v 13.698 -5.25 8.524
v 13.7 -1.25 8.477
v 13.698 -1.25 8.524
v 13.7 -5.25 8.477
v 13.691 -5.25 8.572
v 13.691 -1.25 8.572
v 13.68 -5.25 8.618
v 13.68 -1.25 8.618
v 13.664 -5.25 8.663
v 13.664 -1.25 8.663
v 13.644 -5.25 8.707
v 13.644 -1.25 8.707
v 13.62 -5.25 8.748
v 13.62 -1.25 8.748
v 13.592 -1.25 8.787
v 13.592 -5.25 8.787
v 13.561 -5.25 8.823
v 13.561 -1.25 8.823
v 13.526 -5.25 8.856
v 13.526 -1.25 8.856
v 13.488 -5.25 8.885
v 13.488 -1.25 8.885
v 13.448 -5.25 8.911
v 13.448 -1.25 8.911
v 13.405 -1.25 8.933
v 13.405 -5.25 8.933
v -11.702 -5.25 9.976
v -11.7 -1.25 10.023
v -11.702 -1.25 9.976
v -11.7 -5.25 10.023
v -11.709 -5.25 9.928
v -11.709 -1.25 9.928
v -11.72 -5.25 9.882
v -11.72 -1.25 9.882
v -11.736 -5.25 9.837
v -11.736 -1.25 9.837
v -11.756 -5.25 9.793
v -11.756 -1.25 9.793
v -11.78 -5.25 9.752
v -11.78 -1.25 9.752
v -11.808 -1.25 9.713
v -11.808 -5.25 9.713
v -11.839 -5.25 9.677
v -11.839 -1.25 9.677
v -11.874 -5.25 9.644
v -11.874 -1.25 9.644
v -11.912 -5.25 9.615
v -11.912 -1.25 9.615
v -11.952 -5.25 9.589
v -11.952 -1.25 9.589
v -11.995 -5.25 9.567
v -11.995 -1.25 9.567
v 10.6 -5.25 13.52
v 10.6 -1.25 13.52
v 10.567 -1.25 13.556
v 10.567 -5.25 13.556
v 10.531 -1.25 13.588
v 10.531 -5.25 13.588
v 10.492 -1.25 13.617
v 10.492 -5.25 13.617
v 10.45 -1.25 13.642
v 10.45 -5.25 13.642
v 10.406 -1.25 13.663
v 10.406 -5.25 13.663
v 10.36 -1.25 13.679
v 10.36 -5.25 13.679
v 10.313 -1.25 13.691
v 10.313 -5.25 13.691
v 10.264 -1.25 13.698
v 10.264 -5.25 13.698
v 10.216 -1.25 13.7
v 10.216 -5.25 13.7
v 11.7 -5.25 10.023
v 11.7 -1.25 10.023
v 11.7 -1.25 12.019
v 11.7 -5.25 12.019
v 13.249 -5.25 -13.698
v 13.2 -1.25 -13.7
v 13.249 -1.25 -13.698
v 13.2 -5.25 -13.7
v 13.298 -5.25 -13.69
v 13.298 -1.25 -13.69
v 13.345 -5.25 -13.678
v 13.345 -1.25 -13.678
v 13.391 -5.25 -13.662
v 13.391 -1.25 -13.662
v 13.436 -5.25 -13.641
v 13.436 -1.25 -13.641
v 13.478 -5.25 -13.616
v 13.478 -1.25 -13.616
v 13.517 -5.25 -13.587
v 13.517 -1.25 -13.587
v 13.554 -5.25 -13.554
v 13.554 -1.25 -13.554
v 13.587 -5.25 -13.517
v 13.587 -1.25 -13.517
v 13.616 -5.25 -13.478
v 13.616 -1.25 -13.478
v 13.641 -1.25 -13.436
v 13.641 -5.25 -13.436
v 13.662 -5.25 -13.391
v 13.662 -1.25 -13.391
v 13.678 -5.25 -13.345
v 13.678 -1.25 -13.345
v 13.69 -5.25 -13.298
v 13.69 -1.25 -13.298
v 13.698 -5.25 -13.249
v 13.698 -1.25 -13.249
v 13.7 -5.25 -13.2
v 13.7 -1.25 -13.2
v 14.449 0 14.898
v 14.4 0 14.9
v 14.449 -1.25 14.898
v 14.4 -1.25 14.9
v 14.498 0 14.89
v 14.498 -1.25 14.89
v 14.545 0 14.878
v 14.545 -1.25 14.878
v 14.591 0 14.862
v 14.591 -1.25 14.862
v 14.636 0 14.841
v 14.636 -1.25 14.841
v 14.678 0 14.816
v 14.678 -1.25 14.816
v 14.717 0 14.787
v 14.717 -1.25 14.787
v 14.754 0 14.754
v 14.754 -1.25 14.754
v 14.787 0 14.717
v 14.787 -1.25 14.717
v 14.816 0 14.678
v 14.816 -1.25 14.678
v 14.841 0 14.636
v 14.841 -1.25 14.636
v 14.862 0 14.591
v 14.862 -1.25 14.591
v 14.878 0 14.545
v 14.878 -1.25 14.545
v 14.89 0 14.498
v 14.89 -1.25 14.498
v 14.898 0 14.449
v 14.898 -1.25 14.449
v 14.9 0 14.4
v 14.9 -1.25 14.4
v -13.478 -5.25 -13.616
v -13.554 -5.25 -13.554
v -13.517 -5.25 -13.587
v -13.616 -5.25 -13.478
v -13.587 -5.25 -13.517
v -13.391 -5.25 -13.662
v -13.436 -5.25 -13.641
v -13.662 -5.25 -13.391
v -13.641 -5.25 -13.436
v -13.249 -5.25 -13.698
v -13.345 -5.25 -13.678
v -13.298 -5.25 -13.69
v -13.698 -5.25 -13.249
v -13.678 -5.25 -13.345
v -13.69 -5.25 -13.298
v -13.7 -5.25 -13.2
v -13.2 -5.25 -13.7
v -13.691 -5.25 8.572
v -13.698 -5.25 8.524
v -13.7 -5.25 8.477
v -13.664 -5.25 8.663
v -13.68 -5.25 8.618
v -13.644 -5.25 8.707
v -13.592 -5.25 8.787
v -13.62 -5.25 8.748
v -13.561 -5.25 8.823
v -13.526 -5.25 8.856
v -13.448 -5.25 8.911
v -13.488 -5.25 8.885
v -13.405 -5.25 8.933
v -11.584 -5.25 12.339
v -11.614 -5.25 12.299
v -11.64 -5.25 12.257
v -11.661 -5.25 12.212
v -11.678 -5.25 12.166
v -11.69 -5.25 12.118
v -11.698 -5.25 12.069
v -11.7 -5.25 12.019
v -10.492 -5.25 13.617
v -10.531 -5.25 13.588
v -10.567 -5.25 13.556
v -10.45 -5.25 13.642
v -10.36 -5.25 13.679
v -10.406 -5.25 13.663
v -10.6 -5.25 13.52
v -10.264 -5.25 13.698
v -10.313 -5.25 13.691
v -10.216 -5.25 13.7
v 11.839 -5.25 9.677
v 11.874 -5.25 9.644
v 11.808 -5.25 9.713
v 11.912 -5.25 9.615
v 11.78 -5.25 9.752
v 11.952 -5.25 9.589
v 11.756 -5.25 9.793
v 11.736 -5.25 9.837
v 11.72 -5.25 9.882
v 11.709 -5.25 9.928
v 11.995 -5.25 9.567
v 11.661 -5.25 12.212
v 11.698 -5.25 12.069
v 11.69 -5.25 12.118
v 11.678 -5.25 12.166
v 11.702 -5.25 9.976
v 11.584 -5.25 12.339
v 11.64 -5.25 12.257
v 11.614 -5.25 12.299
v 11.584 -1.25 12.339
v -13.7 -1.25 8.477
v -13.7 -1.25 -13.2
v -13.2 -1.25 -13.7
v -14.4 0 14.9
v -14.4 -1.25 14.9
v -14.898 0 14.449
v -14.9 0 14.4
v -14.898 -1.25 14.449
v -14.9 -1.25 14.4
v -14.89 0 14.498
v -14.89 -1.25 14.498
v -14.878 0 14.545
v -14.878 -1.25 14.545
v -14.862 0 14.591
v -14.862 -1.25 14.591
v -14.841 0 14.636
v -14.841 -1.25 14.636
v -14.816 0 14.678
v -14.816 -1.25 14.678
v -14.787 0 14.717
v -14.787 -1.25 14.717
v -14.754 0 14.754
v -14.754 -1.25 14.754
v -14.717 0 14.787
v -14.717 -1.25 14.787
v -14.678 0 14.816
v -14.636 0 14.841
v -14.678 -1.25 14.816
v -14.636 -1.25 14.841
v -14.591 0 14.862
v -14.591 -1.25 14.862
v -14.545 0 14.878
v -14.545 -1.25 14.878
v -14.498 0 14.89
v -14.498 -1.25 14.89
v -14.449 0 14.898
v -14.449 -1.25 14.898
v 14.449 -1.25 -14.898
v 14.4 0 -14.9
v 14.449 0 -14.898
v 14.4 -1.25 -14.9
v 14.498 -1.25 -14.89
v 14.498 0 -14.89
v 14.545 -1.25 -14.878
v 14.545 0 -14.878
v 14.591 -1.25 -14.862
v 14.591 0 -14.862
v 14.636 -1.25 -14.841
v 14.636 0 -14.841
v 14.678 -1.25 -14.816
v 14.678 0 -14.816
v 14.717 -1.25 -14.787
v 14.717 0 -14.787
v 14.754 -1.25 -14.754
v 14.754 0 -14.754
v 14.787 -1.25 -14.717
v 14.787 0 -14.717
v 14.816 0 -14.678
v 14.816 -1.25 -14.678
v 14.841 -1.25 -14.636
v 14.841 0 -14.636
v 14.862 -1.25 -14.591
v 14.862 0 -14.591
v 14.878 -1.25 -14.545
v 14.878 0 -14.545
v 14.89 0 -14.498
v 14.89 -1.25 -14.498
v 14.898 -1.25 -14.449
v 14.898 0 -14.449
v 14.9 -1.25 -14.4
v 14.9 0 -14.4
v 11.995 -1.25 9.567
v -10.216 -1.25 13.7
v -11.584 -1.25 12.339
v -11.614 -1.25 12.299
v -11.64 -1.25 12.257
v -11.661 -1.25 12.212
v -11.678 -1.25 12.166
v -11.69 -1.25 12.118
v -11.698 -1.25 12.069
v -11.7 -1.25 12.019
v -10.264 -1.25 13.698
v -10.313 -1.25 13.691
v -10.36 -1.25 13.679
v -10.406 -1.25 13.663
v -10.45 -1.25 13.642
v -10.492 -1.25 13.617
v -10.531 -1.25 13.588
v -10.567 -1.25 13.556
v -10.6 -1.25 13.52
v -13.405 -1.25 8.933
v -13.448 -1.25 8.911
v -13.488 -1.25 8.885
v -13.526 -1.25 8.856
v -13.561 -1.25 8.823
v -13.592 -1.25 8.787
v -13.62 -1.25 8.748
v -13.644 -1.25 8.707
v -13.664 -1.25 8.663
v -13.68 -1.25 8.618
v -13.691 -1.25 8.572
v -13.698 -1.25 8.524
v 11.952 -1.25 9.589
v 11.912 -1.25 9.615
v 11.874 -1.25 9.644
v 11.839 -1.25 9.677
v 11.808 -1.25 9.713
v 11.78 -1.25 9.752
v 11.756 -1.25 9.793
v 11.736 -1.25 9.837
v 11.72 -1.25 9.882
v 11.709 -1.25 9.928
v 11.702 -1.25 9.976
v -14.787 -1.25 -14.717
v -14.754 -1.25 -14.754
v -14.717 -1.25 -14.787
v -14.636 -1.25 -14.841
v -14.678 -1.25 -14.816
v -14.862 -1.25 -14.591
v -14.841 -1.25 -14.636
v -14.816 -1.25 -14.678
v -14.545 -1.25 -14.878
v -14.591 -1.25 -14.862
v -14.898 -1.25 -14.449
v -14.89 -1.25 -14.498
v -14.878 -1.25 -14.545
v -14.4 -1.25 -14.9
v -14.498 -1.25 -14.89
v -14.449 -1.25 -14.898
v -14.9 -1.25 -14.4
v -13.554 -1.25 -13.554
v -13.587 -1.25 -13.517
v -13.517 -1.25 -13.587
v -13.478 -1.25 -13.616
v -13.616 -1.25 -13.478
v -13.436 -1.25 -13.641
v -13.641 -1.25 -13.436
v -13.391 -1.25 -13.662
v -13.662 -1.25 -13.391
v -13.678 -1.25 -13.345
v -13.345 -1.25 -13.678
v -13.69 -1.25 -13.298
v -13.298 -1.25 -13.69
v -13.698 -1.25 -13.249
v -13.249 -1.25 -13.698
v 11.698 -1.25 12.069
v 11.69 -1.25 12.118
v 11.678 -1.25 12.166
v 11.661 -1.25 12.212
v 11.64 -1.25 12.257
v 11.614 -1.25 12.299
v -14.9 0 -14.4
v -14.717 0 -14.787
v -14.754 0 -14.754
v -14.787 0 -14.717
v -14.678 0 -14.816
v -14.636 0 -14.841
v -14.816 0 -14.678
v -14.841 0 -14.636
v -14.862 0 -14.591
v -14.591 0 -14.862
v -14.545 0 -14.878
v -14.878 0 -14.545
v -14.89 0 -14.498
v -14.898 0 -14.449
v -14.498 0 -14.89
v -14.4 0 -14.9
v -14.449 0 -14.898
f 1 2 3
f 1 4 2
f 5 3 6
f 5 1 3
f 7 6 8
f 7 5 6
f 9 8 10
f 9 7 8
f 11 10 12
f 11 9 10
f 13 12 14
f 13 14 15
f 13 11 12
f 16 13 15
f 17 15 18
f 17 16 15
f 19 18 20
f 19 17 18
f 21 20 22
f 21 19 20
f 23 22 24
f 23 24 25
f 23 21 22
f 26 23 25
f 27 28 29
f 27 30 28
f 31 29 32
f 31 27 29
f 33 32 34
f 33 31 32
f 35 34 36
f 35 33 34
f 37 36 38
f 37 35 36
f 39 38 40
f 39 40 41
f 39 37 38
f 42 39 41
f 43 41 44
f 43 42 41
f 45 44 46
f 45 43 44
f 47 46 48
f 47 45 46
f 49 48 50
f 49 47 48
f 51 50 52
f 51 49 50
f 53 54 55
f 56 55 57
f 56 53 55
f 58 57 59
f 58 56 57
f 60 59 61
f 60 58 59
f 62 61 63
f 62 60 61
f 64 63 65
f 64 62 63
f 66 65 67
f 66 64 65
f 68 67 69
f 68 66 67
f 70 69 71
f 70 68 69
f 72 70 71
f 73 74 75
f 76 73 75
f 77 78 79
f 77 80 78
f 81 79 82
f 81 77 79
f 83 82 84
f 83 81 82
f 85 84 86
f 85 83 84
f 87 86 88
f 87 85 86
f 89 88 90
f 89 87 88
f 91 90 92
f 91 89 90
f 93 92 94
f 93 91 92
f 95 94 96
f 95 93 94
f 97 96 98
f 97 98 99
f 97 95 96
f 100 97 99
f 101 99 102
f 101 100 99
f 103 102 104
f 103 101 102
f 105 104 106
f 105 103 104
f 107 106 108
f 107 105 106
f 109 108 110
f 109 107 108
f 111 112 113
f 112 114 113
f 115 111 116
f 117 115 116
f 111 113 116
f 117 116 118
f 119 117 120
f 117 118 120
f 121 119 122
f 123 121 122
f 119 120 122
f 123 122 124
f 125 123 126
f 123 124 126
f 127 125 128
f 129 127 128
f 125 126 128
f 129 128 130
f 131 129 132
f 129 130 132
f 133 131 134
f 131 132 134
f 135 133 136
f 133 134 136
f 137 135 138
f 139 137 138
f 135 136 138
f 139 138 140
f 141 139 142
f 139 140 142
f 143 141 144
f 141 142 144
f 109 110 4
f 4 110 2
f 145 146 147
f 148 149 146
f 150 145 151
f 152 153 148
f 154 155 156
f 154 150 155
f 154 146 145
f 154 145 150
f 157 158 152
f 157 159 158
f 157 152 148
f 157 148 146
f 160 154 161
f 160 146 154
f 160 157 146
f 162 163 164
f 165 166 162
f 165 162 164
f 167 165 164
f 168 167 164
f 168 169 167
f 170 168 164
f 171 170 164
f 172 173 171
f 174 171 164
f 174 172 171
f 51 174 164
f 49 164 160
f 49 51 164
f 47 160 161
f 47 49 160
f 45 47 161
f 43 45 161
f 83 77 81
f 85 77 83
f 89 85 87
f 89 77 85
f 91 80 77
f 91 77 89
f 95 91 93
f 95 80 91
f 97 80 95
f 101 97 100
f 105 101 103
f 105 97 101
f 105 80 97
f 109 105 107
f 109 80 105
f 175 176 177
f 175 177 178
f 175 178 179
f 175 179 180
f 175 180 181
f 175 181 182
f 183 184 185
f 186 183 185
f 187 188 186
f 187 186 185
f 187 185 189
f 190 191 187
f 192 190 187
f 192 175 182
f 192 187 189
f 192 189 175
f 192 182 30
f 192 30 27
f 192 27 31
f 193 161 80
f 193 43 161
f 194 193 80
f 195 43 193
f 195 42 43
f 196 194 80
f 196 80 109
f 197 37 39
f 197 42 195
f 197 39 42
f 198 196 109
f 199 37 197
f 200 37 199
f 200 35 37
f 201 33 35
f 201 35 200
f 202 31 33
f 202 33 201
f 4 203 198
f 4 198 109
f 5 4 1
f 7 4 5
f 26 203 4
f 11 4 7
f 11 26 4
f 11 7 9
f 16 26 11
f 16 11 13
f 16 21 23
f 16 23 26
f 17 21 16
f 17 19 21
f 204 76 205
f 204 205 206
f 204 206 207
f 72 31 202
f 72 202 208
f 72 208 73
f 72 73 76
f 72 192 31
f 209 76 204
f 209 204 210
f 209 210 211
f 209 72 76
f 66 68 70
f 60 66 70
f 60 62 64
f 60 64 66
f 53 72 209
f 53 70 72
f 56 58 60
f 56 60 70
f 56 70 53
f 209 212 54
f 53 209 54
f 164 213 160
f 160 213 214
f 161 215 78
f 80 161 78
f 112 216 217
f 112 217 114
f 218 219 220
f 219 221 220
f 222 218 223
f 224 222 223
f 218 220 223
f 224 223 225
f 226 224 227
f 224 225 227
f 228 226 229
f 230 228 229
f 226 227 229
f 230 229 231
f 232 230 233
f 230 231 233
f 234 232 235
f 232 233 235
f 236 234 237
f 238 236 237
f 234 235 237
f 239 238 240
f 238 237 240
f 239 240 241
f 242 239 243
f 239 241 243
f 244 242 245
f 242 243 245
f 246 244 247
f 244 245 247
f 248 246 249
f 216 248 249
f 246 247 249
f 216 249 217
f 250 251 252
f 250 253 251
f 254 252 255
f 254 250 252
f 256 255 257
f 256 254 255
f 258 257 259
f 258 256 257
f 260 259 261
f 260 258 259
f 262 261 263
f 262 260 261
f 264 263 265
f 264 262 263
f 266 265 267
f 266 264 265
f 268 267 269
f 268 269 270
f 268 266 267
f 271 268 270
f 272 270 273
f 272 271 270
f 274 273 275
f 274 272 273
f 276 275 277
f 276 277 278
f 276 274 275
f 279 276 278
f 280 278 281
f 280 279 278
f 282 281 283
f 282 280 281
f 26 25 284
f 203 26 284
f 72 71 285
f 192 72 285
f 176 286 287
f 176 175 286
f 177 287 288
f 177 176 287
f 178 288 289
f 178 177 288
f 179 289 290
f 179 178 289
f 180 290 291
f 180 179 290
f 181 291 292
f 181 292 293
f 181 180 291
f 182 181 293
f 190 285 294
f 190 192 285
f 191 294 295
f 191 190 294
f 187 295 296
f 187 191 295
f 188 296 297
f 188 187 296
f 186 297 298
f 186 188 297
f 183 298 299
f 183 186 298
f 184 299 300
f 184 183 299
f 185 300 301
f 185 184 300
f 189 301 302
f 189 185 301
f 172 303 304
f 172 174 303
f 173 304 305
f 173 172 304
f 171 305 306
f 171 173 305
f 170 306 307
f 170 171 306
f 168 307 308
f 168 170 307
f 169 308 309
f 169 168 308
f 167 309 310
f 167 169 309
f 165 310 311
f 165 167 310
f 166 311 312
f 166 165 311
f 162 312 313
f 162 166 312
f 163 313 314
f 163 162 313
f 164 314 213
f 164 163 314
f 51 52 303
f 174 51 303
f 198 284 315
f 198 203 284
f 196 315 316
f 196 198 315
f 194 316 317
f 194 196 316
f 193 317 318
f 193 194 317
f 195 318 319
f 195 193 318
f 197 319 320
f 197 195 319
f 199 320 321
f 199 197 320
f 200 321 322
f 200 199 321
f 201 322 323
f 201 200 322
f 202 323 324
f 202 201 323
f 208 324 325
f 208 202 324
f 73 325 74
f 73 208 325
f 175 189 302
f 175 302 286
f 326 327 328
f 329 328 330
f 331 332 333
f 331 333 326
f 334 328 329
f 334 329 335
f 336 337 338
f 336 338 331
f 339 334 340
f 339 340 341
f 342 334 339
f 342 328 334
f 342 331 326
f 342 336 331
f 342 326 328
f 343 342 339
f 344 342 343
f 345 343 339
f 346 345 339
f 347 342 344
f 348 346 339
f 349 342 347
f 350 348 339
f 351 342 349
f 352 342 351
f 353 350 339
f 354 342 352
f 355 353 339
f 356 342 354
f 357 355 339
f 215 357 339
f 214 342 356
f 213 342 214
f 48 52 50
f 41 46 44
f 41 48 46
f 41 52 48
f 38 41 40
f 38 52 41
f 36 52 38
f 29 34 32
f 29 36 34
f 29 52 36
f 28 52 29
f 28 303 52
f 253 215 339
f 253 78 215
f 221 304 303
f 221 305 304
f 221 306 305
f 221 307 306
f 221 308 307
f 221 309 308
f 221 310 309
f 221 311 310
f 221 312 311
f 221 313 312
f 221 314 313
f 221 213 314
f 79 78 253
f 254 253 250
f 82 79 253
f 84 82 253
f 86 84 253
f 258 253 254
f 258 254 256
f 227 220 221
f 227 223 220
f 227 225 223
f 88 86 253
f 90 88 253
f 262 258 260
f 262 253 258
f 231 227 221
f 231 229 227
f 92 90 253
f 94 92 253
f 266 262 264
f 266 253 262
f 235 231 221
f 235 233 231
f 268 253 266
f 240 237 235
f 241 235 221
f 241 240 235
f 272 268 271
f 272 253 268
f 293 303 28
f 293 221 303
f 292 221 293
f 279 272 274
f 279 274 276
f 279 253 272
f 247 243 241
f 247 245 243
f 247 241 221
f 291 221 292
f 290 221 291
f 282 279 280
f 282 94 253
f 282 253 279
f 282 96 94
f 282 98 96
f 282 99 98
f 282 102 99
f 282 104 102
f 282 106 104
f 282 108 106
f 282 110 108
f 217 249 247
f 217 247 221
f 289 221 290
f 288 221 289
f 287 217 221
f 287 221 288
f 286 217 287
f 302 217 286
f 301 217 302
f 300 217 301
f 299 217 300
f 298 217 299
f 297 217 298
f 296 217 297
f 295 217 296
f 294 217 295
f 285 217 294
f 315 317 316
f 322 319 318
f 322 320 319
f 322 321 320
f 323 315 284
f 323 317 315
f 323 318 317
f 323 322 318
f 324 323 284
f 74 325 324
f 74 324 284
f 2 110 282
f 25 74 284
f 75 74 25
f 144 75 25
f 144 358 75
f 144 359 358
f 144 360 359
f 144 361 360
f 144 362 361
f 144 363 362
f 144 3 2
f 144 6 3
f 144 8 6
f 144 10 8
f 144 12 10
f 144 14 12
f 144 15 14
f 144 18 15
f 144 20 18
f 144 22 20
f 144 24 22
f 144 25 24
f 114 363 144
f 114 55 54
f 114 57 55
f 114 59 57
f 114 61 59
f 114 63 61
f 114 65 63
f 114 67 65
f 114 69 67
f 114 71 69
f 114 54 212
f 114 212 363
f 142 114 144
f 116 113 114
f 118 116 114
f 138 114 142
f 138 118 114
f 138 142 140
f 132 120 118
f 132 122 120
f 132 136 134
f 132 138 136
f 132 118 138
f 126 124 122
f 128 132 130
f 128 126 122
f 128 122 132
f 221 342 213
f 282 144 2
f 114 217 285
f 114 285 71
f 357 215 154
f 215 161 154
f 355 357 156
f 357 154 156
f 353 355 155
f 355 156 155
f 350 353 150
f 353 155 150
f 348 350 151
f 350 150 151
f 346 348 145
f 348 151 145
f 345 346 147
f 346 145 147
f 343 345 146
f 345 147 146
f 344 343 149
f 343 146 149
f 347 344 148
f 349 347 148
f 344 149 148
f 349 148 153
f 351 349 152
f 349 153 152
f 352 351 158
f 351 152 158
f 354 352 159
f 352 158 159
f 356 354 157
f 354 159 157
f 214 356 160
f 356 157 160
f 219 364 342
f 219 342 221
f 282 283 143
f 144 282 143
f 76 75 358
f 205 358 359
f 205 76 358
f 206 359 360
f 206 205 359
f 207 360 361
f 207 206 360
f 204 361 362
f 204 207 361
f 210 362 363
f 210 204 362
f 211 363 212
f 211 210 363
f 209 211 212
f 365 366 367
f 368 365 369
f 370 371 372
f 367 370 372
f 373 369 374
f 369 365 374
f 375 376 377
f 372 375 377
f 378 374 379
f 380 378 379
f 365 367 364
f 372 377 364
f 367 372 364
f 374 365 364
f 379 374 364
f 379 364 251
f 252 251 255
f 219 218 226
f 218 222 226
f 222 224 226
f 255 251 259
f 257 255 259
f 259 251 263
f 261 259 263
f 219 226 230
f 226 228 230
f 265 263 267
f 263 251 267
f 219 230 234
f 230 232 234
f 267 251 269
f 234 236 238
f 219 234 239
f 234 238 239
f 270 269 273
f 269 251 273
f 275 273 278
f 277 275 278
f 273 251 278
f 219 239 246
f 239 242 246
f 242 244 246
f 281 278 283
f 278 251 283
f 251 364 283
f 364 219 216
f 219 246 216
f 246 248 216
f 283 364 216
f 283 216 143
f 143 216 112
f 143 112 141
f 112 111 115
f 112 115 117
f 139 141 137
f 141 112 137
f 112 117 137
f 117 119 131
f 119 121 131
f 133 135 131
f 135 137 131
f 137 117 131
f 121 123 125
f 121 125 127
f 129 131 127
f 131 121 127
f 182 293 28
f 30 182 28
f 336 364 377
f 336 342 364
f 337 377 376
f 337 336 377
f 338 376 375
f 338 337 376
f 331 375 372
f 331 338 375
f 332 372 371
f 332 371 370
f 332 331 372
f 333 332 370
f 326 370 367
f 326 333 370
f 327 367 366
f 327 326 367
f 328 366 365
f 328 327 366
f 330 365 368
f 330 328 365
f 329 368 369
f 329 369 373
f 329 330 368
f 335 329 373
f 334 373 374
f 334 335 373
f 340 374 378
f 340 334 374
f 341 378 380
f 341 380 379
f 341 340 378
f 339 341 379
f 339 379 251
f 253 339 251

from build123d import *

# Parameters (mm, degrees)
F0_W     = 29.8
F0_H     = 29.8
F1_DEPTH = 1.25
F3_DEPTH = 4
F4_R     = 0.5


with BuildPart() as f1:
    # F0 (on Front) → F1 (new body)
    with BuildSketch(Plane.XZ):
        Rectangle(F0_W, F0_H)
    extrude(amount=F1_DEPTH)

    # F2 (on face) → F3 (join)
    with BuildSketch(Plane.XZ.offset(1.25)):
        Polygon((-13.7, -13.7), (0, -13.7), (13.7, -13.7), (13.7, 8.8), (11.7, 9.7), (11.7, 12.2), (10.45, 13.7), (0, 13.7), (-10.45, 13.7), (-11.7, 12.2), (-11.7, 9.7), (-13.7, 8.8), align=None)
    extrude(amount=F3_DEPTH)

    # F4
    f4_edges = [f1.edges().sort_by_distance(p)[0] for p in [
        (-14.9, -0.625, 14.9),
        (-14.9, -0.625, -14.9),
        (-11.7, -3.25, 12.2),
        (-10.45, -3.25, 13.7),
        (-11.7, -3.25, 9.7),
        (-13.7, -3.25, 8.8),
        (-13.7, -3.25, -13.7),
        (14.9, -0.625, 14.9),
        (14.9, -0.625, -14.9),
        (13.7, -3.25, -13.7),
        (13.7, -3.25, 8.8),
        (11.7, -3.25, 9.7),
        (11.7, -3.25, 12.2),
        (10.45, -3.25, 13.7),
    ]]
    fillet(f4_edges, radius=F4_R)


solid = f1.part
